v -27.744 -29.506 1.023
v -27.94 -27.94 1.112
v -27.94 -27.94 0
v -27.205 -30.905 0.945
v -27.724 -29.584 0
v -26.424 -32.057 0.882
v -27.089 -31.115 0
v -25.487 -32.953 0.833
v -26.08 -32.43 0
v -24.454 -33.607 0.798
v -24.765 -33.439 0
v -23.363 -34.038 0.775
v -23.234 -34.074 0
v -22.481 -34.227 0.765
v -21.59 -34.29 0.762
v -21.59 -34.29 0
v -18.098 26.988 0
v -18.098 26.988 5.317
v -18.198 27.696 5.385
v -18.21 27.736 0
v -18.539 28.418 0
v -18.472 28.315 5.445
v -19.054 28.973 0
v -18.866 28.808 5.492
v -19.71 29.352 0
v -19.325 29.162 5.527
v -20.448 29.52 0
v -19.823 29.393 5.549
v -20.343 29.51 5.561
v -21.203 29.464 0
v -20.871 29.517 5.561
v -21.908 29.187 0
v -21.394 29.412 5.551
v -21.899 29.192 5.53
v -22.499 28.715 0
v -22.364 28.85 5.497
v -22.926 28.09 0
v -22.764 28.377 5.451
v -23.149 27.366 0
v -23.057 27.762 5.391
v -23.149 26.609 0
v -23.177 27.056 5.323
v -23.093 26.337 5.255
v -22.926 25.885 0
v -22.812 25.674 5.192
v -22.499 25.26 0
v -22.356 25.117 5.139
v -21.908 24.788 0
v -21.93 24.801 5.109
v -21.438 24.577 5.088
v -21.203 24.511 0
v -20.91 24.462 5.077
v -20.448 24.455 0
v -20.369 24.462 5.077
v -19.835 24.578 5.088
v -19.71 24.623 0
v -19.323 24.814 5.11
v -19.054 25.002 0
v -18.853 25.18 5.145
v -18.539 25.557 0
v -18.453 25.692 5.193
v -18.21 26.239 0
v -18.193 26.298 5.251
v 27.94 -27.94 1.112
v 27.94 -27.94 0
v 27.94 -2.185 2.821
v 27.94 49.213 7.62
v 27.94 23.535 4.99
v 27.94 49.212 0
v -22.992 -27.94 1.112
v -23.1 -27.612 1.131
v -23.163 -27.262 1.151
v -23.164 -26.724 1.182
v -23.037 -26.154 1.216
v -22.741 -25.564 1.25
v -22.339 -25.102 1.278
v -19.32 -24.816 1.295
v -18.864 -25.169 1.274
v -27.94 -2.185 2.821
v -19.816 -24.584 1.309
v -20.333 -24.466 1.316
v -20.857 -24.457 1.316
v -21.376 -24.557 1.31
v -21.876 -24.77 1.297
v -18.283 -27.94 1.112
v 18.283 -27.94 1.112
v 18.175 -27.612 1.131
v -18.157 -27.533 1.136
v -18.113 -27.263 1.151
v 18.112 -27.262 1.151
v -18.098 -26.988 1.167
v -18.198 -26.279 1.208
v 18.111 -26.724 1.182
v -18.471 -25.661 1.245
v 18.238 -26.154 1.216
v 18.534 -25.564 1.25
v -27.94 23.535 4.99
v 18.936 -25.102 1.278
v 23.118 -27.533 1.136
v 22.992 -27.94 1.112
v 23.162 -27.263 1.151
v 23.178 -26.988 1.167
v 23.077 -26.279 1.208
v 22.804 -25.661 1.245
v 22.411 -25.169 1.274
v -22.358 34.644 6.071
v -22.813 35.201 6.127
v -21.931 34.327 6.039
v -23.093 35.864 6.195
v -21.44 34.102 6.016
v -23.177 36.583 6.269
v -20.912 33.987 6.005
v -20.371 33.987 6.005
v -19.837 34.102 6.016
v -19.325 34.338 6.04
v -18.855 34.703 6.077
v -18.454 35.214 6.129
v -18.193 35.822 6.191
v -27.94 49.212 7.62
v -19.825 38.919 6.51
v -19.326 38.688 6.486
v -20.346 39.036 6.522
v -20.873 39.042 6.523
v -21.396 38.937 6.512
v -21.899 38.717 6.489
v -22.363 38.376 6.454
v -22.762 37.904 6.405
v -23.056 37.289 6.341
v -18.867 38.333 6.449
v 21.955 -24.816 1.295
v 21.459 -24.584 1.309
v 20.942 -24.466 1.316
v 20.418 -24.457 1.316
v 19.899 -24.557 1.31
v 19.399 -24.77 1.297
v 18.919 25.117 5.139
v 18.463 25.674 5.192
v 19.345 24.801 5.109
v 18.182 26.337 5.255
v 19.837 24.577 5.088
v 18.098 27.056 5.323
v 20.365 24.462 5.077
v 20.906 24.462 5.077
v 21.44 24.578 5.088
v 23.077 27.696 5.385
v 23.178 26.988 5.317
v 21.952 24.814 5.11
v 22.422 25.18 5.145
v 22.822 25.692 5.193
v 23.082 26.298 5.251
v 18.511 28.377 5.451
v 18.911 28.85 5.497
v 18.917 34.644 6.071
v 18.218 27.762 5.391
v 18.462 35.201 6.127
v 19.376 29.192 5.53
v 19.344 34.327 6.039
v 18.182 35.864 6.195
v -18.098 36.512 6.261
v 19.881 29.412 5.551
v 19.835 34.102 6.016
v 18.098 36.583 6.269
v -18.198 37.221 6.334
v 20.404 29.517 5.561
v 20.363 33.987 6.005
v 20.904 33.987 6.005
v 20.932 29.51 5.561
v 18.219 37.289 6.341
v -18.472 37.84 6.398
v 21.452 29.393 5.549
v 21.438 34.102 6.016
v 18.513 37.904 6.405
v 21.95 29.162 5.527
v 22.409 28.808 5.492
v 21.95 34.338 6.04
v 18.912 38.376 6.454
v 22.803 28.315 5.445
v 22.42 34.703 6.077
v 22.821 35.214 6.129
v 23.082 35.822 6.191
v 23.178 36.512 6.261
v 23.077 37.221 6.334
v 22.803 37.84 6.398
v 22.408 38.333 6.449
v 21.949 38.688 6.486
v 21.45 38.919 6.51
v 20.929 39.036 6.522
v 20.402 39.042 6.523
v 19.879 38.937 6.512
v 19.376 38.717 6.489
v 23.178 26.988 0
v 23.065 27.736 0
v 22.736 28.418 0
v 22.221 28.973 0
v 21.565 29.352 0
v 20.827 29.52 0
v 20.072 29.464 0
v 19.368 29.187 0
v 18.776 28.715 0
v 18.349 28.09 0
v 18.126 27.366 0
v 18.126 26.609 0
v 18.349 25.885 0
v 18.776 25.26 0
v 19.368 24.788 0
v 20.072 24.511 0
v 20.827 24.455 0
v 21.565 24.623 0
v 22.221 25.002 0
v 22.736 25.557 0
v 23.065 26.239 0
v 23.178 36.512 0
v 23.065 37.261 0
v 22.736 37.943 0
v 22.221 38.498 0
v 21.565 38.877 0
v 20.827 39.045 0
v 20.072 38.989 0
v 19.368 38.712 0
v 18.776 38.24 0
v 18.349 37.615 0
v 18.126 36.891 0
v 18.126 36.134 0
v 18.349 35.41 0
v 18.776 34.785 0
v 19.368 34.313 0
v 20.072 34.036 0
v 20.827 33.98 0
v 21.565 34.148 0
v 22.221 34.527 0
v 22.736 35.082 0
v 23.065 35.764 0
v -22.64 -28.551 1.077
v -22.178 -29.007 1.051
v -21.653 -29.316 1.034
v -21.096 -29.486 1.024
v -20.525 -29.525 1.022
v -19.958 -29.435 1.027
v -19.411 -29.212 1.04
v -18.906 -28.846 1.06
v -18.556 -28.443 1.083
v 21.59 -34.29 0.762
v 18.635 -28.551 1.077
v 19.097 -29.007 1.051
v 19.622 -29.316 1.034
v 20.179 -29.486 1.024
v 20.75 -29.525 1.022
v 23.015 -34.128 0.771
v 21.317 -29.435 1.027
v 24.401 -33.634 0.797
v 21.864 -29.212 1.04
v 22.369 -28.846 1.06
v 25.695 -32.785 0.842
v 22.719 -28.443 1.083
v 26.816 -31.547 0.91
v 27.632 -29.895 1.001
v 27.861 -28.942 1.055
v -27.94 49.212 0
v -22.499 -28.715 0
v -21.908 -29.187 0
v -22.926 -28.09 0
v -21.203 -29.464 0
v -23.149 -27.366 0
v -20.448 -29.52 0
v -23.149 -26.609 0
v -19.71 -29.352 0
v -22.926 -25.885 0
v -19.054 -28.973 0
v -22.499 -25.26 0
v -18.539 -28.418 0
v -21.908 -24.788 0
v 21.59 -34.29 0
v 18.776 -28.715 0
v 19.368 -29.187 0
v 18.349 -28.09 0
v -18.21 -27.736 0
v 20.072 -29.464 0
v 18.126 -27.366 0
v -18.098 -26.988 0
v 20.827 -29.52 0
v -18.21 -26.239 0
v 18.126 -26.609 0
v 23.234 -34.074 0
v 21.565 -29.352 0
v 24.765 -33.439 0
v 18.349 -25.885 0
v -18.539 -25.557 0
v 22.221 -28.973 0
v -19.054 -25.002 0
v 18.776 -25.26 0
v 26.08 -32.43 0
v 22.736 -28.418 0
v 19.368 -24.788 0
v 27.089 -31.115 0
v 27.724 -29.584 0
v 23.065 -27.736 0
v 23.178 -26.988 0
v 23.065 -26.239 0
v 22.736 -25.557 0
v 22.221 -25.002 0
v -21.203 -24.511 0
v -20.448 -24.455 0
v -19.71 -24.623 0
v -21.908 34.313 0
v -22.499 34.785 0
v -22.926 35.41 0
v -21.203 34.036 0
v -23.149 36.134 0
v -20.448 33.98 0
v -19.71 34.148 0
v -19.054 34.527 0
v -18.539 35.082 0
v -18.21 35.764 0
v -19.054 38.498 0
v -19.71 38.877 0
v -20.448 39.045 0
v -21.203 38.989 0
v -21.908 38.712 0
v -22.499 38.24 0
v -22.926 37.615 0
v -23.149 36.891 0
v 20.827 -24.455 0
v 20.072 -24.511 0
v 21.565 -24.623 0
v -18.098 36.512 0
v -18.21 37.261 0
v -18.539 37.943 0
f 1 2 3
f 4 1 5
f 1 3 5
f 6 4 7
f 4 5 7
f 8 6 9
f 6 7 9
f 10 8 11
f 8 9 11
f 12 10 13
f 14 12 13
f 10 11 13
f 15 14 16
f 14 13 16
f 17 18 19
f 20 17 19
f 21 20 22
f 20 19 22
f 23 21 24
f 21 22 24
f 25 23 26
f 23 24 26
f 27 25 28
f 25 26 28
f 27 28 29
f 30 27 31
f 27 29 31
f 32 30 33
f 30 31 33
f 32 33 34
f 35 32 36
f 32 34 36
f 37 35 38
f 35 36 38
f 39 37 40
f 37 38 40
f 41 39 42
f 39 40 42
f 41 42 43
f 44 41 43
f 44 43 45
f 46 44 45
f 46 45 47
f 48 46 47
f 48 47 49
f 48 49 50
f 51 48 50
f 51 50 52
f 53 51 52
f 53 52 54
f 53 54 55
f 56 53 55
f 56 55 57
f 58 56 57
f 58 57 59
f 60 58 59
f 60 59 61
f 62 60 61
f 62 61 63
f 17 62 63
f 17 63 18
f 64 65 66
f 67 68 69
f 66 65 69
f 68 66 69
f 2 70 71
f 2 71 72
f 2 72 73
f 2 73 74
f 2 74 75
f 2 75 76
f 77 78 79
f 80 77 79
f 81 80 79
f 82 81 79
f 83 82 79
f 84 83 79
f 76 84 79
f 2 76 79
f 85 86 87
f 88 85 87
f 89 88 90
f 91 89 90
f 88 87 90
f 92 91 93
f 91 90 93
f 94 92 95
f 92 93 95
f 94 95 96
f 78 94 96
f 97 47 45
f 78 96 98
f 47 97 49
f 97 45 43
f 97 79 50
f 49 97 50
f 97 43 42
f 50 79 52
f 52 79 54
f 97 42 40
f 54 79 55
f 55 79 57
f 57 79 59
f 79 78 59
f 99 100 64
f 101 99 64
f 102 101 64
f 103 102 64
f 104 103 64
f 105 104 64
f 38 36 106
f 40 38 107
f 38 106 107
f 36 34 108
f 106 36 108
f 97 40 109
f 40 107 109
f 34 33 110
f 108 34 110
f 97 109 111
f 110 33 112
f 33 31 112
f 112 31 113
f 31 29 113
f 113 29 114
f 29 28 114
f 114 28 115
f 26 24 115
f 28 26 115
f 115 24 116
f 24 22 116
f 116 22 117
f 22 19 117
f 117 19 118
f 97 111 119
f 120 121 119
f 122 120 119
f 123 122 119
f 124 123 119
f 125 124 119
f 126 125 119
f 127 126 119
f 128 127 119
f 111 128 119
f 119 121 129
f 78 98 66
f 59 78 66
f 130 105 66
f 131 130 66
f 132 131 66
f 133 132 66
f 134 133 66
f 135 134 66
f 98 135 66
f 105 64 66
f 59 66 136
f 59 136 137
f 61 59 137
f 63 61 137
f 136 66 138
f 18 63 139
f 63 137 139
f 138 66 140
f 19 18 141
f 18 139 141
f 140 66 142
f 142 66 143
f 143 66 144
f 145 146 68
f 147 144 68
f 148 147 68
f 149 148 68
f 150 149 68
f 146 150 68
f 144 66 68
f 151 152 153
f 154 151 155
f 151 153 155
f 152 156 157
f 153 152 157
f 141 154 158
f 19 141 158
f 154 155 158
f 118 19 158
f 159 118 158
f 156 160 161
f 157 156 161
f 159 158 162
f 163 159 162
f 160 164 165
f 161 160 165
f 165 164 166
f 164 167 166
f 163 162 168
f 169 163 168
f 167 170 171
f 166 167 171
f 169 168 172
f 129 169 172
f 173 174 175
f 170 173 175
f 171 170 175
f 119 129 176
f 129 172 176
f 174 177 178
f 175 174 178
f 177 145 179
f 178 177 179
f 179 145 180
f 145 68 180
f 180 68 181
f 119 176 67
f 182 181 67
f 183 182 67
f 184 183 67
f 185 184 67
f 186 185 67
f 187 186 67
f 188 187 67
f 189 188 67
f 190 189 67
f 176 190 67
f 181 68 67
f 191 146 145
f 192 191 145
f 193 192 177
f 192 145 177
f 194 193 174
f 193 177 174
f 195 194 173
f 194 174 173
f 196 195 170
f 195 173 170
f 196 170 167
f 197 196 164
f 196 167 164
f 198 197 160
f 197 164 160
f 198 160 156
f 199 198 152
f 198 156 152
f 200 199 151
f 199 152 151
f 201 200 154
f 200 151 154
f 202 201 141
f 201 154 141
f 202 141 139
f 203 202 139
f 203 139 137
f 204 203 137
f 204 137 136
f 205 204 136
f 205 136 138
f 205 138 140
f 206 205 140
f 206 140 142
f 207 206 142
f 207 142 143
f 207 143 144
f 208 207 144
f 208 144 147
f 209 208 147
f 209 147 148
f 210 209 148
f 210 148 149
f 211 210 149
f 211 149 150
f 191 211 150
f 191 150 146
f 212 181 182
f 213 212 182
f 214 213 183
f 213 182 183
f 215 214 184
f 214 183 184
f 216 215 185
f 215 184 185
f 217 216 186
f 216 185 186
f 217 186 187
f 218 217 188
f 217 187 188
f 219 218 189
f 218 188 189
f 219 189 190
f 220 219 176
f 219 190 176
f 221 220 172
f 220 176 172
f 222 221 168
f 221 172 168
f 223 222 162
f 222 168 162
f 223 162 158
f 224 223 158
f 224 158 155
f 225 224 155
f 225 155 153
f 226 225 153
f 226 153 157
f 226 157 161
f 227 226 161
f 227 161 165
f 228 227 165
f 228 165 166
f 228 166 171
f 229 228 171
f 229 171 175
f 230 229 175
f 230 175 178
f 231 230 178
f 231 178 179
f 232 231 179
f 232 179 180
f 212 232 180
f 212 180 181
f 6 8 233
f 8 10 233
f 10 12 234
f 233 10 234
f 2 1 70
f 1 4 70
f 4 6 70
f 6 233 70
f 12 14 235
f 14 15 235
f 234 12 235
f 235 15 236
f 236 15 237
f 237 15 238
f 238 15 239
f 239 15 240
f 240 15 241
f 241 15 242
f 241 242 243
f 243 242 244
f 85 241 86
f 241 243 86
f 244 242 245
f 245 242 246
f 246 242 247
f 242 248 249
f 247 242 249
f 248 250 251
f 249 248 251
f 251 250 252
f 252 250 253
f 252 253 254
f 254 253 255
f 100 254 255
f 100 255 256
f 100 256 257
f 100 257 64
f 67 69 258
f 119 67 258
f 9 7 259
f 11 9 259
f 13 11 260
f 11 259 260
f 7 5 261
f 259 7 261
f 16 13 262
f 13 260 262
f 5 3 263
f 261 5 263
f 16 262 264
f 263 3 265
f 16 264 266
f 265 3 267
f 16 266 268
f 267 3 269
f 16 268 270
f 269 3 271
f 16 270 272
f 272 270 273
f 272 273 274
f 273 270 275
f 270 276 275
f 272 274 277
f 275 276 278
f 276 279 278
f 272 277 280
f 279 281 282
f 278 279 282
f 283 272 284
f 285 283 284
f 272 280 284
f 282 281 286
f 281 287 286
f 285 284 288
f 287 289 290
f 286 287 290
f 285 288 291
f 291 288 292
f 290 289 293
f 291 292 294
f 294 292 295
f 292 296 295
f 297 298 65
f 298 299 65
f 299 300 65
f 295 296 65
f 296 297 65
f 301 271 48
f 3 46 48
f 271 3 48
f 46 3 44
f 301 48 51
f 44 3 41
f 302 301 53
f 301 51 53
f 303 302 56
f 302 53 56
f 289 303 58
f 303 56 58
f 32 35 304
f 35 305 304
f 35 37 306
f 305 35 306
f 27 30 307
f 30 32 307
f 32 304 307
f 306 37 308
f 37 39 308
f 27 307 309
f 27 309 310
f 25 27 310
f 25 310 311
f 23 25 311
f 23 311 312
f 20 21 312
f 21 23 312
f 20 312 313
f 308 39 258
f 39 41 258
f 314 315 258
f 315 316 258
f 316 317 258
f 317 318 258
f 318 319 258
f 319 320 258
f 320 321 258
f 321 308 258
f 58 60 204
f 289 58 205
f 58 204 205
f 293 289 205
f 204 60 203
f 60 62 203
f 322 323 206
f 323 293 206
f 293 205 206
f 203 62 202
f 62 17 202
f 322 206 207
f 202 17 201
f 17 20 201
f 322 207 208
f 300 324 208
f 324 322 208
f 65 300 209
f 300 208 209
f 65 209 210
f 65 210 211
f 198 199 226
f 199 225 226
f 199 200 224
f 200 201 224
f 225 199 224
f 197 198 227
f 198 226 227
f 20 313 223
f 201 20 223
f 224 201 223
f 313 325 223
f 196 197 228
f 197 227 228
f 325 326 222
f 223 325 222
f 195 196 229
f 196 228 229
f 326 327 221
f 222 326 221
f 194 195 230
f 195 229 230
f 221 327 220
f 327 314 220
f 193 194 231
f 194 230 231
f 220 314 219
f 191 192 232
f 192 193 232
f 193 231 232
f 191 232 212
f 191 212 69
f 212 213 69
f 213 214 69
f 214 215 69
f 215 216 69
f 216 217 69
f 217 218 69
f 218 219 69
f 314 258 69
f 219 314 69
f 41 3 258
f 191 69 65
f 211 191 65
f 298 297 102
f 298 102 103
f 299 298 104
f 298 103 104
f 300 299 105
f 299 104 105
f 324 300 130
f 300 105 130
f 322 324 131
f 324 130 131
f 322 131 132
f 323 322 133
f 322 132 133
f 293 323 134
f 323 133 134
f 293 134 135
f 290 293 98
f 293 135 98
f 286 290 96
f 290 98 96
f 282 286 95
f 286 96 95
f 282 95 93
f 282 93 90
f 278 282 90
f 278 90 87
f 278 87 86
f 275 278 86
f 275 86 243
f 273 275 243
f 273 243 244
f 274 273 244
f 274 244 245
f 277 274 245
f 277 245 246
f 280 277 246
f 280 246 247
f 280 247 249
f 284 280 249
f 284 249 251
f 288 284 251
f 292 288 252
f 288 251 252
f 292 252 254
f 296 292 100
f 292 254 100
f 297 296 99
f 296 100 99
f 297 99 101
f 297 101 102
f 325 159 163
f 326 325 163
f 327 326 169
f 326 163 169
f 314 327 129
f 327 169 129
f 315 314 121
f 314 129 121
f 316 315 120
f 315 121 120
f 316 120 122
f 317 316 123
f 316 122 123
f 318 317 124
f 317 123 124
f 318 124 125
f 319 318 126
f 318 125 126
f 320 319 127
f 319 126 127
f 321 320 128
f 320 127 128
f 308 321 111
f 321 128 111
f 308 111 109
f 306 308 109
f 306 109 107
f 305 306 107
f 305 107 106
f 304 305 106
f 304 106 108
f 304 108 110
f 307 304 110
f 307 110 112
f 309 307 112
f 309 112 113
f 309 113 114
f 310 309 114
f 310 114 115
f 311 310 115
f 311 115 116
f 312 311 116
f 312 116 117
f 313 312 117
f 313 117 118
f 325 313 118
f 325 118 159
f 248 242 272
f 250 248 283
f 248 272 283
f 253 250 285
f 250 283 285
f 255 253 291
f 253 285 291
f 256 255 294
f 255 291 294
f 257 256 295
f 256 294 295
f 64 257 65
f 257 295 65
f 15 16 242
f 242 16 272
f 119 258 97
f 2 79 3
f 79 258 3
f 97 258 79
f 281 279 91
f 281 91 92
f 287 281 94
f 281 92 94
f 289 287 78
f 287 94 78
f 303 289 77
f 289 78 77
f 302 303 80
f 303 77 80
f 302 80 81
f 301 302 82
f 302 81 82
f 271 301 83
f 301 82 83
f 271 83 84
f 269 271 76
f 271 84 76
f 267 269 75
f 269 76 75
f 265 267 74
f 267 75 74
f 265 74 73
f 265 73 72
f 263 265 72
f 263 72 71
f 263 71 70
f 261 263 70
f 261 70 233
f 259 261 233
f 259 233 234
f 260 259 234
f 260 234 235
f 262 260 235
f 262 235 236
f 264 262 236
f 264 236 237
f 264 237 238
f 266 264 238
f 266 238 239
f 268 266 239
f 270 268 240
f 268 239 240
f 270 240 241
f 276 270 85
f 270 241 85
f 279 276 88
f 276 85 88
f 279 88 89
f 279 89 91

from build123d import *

# Parameters (mm, degrees)
BOSS_EXTRUDE1_DEPTH = 7.62
SKETCH2_R           = 2.54
CUT_EXTRUDE1_DEPTH  = 58.101472453
CUT_EXTRUDE2_DEPTH  = 75.849909527


with BuildPart() as part:
    # Sketch1 → Boss-Extrude1 (new body)
    with BuildSketch(Plane.XY):
        with BuildLine():
            Line((27.94, 49.2125), (-27.94, 49.2125))
            Line((-27.94, 49.2125), (-27.94, -27.94))
            ThreePointArc((-27.94, -27.94), (-26.080128061, -32.430128061), (-21.59, -34.29))
            Line((-21.59, -34.29), (21.59, -34.29))
            ThreePointArc((21.59, -34.29), (26.080128061, -32.430128061), (27.94, -27.94))
            Line((27.94, -27.94), (27.94, 49.2125))
        make_face()
    extrude(amount=BOSS_EXTRUDE1_DEPTH)

    # Sketch2 → Cut-Extrude1 (cut, through all)
    with BuildSketch(Plane.XY.offset(7.62)):
        with Locations((-20.6375, 36.5125)):
            Circle(SKETCH2_R)
        with Locations((-20.6375, 26.9875)):
            Circle(SKETCH2_R)
        with Locations((-20.6375, -26.9875)):
            Circle(SKETCH2_R)
        with Locations((20.6375, 36.5125)):
            Circle(SKETCH2_R)
        with Locations((20.6375, 26.9875)):
            Circle(SKETCH2_R)
        with Locations((20.6375, -26.9875)):
            Circle(SKETCH2_R)
    extrude(amount=-CUT_EXTRUDE1_DEPTH, mode=Mode.SUBTRACT)

    # Sketch3 → Cut-Extrude2 (cut, through all)
    with BuildSketch(Plane(origin=(27.94, 0, 0), x_dir=(0, 0, -1), z_dir=(1, 0, 0))):
        with BuildLine():
            ThreePointArc((-1.112162836, -27.94), (-3.848021385, 10.679948524), (-7.62, 49.2125))
            Line((-7.62, 49.2125), (-7.62, -27.94))
            Line((-7.62, -27.94), (-1.112162836, -27.94))
        make_face()
        with BuildLine():
            Line((-1.112162836, -27.94), (-7.62, -27.94))
            Line((-7.62, -27.94), (-7.62, -34.29))
            Line((-7.62, -34.29), (-0.762, -34.29))
            ThreePointArc((-0.762, -34.29), (-0.933579794, -31.114806907), (-1.112162836, -27.94))
        make_face()
    extrude(amount=-CUT_EXTRUDE2_DEPTH, mode=Mode.SUBTRACT)


solid = part.part
